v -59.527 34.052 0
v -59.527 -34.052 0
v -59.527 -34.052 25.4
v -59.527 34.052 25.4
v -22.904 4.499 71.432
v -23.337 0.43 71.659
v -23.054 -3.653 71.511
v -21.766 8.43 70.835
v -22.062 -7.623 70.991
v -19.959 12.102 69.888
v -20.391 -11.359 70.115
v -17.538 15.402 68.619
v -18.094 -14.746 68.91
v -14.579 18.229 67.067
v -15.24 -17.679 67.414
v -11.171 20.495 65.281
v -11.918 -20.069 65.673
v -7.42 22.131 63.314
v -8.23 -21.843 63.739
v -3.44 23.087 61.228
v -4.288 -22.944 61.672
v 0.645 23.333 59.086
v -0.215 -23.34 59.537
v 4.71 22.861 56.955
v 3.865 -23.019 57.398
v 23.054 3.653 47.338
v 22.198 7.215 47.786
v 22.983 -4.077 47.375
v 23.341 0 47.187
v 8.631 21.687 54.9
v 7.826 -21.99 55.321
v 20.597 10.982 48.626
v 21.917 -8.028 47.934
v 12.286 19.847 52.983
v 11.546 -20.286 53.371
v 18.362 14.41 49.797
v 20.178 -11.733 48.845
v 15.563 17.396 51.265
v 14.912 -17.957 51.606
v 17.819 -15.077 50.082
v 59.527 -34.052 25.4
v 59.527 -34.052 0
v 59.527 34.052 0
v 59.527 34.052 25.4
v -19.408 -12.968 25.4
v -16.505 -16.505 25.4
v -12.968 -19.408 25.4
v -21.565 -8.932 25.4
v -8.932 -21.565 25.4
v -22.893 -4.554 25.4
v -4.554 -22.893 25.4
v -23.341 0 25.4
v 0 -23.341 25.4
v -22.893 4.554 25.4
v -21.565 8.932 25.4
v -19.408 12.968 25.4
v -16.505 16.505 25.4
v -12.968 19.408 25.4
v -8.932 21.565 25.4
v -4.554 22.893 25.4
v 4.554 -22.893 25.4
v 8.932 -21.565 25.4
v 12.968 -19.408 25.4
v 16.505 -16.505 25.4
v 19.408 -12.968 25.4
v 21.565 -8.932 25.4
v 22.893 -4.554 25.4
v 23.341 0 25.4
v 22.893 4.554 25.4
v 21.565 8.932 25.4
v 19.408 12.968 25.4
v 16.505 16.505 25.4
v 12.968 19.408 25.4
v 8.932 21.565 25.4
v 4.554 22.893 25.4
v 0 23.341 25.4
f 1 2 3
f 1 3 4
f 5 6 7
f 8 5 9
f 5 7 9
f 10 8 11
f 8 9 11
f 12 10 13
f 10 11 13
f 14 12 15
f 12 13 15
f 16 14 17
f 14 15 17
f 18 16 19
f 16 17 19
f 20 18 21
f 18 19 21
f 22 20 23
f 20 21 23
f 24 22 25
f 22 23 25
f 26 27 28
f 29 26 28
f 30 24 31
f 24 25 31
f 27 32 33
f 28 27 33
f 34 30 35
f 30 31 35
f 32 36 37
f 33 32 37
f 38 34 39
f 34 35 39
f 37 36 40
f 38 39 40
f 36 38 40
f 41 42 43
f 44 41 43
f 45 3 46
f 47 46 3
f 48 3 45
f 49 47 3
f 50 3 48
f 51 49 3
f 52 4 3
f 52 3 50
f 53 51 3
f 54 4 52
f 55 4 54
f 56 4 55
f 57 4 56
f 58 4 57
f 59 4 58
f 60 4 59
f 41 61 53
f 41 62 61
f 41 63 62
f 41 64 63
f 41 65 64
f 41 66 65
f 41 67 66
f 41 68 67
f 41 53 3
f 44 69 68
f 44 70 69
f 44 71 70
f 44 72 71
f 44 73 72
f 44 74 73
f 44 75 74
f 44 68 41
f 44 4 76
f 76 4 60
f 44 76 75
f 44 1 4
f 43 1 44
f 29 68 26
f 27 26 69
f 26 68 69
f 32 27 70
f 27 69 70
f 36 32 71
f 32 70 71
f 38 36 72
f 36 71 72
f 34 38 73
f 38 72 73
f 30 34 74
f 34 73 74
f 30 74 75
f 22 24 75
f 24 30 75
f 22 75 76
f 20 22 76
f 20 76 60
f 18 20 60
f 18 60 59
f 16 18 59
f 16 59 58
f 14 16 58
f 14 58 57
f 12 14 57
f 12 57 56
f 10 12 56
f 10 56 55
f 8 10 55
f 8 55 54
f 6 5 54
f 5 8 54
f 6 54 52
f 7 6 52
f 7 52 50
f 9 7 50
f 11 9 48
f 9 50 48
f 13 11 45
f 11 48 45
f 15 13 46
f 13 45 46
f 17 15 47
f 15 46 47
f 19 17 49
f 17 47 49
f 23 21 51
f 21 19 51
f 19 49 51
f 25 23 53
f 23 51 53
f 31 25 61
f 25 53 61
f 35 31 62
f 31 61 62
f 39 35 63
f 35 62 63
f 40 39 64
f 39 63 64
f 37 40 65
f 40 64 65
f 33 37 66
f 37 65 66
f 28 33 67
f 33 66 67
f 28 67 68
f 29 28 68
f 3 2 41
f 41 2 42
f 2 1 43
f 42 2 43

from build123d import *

# Parameters (mm, degrees)
F0_W     = 119.054884
F0_H     = 68.104512
F1_DEPTH = 25.4
F2_R     = 23.34143
F3_DEPTH = 47.244
F5_DEPTH = 32.512


with BuildPart() as f1:
    # F0 (on Top) → F1 (new body)
    with BuildSketch(Plane.XY):
        Rectangle(F0_W, F0_H)
    extrude(amount=F1_DEPTH)

    # F2 (on face) → F3 (join)
    with BuildSketch(Plane.XY.offset(25.4)):
        Circle(F2_R)
    extrude(amount=F3_DEPTH)

    # F4 (on Front) → F5 (cut, symmetric)
    with BuildSketch(Plane.XZ):
        Polygon((40.58107, 78.345791), (-36.091031, 78.345791), (40.58107, 38.148768), align=None)
    extrude(amount=F5_DEPTH, both=True, mode=Mode.SUBTRACT)


solid = f1.part
